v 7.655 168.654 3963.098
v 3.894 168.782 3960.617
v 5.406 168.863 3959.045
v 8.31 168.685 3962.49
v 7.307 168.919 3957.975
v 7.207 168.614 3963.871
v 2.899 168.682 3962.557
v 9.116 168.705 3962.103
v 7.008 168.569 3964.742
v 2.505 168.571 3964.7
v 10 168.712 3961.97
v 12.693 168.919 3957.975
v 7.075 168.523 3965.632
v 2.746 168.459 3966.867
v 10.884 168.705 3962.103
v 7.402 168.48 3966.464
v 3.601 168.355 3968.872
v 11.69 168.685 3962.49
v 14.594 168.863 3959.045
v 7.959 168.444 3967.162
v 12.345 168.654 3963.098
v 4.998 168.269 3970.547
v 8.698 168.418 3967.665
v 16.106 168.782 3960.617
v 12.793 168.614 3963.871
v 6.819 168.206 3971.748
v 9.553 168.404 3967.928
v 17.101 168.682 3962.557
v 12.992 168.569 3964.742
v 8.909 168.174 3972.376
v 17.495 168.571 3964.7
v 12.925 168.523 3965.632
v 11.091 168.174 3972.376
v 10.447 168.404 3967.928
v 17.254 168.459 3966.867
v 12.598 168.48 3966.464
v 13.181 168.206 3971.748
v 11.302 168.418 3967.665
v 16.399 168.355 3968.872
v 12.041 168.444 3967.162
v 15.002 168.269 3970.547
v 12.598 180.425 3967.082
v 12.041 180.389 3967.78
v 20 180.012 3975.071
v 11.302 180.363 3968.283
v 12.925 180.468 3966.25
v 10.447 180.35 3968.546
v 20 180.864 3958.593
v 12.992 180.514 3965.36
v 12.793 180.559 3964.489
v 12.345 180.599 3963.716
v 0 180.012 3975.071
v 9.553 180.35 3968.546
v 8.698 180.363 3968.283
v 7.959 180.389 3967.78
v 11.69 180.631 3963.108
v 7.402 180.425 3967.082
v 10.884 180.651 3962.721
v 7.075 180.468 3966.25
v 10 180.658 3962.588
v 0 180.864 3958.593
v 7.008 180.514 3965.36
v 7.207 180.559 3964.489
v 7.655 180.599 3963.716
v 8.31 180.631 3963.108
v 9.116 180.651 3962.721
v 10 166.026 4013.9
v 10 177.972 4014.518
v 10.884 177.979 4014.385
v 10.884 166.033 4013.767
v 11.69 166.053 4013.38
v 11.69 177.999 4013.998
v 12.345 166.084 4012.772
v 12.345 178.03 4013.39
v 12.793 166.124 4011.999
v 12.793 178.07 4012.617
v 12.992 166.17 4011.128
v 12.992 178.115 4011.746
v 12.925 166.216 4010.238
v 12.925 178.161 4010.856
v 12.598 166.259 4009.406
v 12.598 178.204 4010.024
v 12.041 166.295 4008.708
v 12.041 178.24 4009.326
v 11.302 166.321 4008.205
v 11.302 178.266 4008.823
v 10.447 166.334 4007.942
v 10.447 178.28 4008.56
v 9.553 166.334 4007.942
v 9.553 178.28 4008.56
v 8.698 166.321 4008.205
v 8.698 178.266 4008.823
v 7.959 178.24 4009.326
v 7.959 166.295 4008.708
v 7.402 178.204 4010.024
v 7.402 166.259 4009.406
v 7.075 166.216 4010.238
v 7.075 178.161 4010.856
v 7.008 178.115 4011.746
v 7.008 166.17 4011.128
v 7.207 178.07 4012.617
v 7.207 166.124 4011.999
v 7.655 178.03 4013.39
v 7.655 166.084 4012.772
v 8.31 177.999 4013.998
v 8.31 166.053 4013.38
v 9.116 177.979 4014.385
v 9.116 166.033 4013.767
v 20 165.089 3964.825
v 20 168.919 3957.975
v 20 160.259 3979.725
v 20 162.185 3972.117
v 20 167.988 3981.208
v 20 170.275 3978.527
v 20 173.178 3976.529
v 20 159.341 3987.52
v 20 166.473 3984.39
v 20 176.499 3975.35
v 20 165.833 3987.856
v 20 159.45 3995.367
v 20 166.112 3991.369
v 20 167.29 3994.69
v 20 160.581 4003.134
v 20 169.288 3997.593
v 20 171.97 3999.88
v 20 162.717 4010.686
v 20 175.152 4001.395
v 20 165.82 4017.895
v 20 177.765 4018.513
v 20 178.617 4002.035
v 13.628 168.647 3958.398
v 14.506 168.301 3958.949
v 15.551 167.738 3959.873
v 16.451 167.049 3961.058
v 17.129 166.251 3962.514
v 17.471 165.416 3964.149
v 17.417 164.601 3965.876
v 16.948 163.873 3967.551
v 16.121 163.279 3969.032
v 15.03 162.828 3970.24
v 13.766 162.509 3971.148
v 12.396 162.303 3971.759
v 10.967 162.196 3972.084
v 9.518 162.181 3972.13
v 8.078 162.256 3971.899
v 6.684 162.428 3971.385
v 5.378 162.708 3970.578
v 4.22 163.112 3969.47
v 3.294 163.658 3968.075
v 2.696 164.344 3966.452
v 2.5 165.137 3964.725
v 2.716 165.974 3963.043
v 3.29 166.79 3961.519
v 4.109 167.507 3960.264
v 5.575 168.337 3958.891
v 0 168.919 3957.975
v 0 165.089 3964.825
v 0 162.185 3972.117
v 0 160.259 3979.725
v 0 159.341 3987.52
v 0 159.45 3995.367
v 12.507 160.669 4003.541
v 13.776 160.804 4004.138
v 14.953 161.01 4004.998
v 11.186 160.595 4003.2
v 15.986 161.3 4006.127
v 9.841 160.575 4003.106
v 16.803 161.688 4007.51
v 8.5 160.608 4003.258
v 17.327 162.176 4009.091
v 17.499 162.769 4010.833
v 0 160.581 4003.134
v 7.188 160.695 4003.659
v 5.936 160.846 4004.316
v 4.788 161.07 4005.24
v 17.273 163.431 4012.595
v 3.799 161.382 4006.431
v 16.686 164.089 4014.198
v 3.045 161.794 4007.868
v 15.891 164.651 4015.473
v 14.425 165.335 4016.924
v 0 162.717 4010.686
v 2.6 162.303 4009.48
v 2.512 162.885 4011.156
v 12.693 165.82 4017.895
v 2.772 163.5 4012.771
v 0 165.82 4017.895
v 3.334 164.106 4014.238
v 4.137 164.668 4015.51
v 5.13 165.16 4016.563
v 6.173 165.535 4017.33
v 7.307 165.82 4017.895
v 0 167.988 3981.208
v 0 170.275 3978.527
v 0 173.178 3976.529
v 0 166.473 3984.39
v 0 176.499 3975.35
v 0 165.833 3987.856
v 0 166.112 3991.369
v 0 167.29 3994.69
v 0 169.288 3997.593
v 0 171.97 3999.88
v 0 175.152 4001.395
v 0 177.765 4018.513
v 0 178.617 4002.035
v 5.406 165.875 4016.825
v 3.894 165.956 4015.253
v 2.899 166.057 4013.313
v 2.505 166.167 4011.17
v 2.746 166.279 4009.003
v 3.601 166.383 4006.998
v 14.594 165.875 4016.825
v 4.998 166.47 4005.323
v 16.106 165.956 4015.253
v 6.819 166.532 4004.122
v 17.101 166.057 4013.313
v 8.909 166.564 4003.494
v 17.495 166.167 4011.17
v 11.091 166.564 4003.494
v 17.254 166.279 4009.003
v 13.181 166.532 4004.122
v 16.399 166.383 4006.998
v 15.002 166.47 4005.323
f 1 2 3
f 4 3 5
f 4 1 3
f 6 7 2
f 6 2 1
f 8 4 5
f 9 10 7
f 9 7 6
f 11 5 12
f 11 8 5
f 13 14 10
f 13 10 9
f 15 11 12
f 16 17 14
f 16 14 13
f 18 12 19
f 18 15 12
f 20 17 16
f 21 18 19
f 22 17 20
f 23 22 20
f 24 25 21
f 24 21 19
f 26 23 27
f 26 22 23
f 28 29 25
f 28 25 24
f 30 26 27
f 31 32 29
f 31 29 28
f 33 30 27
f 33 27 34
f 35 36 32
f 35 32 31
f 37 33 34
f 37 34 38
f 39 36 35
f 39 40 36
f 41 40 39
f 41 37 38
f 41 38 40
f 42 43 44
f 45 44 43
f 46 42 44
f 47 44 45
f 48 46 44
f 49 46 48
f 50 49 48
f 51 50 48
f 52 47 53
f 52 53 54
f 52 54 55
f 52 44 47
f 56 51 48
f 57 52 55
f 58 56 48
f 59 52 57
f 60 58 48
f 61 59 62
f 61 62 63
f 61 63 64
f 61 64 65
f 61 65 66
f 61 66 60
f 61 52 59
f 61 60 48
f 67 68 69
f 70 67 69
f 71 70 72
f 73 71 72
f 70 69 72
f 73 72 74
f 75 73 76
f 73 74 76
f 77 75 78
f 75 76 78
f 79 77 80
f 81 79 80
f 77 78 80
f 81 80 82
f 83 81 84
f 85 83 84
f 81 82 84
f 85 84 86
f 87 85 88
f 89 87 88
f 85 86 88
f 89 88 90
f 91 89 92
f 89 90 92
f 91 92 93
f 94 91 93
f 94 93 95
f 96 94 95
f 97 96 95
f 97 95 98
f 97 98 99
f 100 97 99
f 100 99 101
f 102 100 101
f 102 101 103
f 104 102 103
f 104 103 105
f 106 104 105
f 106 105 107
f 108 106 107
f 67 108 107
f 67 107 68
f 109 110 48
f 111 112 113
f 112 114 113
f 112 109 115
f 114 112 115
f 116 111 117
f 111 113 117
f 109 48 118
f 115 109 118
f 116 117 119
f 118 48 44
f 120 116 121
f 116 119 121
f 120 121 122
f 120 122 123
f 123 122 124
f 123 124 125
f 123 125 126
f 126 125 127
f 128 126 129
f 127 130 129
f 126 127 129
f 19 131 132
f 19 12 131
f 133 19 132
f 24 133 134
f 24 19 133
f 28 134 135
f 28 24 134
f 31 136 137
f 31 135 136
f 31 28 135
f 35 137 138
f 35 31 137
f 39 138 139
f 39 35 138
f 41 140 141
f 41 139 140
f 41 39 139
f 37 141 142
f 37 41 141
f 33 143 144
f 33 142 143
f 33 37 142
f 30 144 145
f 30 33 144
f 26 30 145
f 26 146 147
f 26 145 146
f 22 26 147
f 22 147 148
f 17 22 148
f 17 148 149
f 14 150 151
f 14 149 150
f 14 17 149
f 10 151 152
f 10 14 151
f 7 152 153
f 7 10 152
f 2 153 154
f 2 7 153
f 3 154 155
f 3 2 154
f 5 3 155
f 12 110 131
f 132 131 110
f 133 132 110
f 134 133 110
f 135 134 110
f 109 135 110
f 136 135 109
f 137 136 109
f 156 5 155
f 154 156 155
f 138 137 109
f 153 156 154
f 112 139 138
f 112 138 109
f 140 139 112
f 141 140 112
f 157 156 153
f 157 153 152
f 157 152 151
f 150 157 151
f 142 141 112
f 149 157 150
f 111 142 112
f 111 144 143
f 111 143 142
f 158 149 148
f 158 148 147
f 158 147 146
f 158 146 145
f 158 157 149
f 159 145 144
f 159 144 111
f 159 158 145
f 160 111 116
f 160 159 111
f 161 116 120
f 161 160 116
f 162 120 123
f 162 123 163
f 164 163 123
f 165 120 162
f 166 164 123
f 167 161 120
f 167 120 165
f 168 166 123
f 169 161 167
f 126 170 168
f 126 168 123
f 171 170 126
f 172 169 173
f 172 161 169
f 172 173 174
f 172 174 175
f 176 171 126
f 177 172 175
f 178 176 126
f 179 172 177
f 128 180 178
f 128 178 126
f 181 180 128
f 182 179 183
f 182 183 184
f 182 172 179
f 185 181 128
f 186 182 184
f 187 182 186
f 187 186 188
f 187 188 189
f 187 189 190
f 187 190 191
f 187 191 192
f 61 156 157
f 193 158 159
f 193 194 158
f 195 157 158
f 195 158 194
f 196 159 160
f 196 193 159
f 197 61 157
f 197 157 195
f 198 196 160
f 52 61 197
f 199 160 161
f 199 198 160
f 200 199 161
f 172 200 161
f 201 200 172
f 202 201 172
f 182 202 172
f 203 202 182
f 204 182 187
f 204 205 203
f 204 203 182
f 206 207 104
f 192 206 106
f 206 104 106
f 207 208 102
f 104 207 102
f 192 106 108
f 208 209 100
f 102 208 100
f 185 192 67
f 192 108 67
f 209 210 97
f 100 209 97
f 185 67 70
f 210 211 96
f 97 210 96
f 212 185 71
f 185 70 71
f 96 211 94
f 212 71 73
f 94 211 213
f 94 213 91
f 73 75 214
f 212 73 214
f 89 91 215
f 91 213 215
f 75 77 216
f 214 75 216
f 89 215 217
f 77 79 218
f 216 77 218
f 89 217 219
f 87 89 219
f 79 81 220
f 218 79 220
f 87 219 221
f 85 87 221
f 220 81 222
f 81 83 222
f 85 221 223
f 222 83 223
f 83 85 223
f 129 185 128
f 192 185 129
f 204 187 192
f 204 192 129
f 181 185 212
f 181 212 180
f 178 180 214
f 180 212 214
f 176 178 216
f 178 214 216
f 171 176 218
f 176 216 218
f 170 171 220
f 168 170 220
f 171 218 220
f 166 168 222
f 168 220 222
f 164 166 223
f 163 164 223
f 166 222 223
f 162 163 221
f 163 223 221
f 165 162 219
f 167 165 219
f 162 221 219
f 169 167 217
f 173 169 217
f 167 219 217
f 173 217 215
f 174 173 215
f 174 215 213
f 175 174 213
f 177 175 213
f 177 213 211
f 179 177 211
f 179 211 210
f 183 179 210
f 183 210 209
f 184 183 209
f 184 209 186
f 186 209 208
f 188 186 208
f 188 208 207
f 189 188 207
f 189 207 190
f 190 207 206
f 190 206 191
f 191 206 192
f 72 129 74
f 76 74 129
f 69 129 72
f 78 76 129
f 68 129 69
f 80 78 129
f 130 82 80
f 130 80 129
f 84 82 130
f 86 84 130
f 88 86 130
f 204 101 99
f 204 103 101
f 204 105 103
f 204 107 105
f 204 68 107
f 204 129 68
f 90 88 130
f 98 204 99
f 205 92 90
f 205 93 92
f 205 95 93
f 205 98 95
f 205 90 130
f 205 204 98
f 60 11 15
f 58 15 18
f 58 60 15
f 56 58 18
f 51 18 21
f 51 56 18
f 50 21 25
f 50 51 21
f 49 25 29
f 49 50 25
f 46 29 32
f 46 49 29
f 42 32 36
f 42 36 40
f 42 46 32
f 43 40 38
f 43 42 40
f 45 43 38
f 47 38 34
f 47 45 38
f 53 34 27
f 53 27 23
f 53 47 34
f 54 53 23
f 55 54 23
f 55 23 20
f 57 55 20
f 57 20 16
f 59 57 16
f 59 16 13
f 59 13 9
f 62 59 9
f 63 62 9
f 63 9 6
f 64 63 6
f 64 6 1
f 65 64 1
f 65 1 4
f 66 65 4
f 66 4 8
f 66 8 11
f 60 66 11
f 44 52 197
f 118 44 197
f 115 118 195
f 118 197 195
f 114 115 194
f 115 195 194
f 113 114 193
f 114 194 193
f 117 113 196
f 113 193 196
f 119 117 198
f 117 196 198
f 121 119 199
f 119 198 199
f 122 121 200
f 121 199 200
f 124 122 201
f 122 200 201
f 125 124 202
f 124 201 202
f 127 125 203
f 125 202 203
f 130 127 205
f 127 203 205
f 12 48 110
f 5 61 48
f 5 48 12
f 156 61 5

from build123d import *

# Parameters (mm, degrees)
EXTRUDE_1_DEPTH     = 20
SKETCH_3_R          = 14
CUT_EXTRUDE_1_DEPTH = 20
SKETCH_4_R          = 3
CUT_EXTRUDE_2_DEPTH = 22.516585743
EXTRUDE_2_DEPTH     = 20
SKETCH_7_R          = 13.5
CUT_EXTRUDE_3_DEPTH = 28
SKETCH_8_R          = 3
CUT_EXTRUDE_4_DEPTH = 20
SKETCH_9_R          = 7.5
SKETCH_9_R_2        = 3
CUT_EXTRUDE_5_DEPTH = 20


# Read off the part's stored shape, not the designer's step: 填料-伸長1
with BuildPart() as part:
    # 填料-伸長1 outline → 填料-伸長1 (new body)
    with BuildSketch(Plane(origin=(0, 0, 0), x_dir=(0, 0, -1), z_dir=(1, 0, 0))):
        Polygon((-4019.675958787, 200.25160655), (-4018.512862627, 177.765080788), (-3958.59296353, 180.864385914), (-3959.75605969, 203.350911676), align=None)
    extrude(amount=EXTRUDE_1_DEPTH)

    # 草圖3 → 除料-伸長1 (cut)
    with BuildSketch(Plane.ZY):
        with Locations((3988.552913079, 179.314733351)):
            Circle(SKETCH_3_R)
    extrude(amount=-CUT_EXTRUDE_1_DEPTH, mode=Mode.SUBTRACT)

    # 草圖4 → 除料-伸長2 (cut)
    with BuildSketch(Plane(origin=(0, 407.076792548, 21.055696166), x_dir=(1, 0, 0), z_dir=(0, 0.9986649849421085, 0.051655085428040495))):
        with Locations(Location((10, -3950.965617011, 0), (0, 0, 270))):
            Circle(SKETCH_4_R)
    cut_extrude_2 = extrude(amount=-CUT_EXTRUDE_2_DEPTH, mode=Mode.SUBTRACT)

    # 鏡射1: 除料-伸長2 across plane
    add(cut_extrude_2.mirror(Plane(origin=(0, -205.275533435, 3968.660313072), x_dir=(1, 0, 0), z_dir=(0, 0.05165508542804326, -0.9986649849421085))), mode=Mode.SUBTRACT)


with BuildPart() as body_2:
    # 草圖6 → 填料-伸長2 (new body)
    with BuildSketch(Plane(origin=(0, 0, 0), x_dir=(0, 0, -1), z_dir=(1, 0, 0))):
        with BuildLine():
            Line((-4017.894989071, 165.819525376), (-4018.512862627, 177.765080788))
            Line((-4018.512862627, 177.765080788), (-3958.59296353, 180.864385914))
            Line((-3958.59296353, 180.864385914), (-3957.975089975, 168.918830502))
            ThreePointArc((-3957.975089975, 168.918830502), (-3987.51981137, 159.341433652), (-4017.894989071, 165.819525376))
        make_face()
    extrude(amount=EXTRUDE_2_DEPTH)

    # 草圖7 → 除料-伸長3 (cut)
    with BuildSketch(Plane.ZY):
        with Locations((3988.552913079, 179.314733351)):
            Circle(SKETCH_7_R)
    extrude(amount=-CUT_EXTRUDE_3_DEPTH, mode=Mode.SUBTRACT)

    # 草圖8 → 除料-伸長4 (cut)
    with BuildSketch(Plane(origin=(0, 384.590266786, 19.892600006), x_dir=(1, 0, 0), z_dir=(0, 0.9986649849421085, 0.05165508542804074))):
        with Locations(Location((10, -3996.965617011, 0), (0, 0, 270))):
            Circle(SKETCH_8_R)
    cut_extrude_4 = extrude(amount=-CUT_EXTRUDE_4_DEPTH, mode=Mode.SUBTRACT)

    # 草圖9 → 除料-伸長5 (cut)
    with BuildSketch(Plane(origin=(0, 372.644711374, 19.27472645), x_dir=(1, 0, 0), z_dir=(0, 0.9986649849421085, 0.05165508542804074))):
        with Locations((10, -3996.965617011)):
            Circle(SKETCH_9_R)
        with Locations(Location((10, -3996.965617011, 0), (0, 0, 270))):
            Circle(SKETCH_9_R_2, mode=Mode.SUBTRACT)
    cut_extrude_5 = extrude(amount=-CUT_EXTRUDE_5_DEPTH, mode=Mode.SUBTRACT)

    # 鏡射4: 除料-伸長4, 除料-伸長5 across plane
    add(cut_extrude_4.mirror(Plane(origin=(0, -205.275533435, 3968.660313072), x_dir=(1, 0, 0), z_dir=(0, 0.05165508542804326, -0.9986649849421085))), mode=Mode.SUBTRACT)
    add(cut_extrude_5.mirror(Plane(origin=(0, -205.275533435, 3968.660313072), x_dir=(1, 0, 0), z_dir=(0, 0.05165508542804326, -0.9986649849421085))), mode=Mode.SUBTRACT)


solid = body_2.part
